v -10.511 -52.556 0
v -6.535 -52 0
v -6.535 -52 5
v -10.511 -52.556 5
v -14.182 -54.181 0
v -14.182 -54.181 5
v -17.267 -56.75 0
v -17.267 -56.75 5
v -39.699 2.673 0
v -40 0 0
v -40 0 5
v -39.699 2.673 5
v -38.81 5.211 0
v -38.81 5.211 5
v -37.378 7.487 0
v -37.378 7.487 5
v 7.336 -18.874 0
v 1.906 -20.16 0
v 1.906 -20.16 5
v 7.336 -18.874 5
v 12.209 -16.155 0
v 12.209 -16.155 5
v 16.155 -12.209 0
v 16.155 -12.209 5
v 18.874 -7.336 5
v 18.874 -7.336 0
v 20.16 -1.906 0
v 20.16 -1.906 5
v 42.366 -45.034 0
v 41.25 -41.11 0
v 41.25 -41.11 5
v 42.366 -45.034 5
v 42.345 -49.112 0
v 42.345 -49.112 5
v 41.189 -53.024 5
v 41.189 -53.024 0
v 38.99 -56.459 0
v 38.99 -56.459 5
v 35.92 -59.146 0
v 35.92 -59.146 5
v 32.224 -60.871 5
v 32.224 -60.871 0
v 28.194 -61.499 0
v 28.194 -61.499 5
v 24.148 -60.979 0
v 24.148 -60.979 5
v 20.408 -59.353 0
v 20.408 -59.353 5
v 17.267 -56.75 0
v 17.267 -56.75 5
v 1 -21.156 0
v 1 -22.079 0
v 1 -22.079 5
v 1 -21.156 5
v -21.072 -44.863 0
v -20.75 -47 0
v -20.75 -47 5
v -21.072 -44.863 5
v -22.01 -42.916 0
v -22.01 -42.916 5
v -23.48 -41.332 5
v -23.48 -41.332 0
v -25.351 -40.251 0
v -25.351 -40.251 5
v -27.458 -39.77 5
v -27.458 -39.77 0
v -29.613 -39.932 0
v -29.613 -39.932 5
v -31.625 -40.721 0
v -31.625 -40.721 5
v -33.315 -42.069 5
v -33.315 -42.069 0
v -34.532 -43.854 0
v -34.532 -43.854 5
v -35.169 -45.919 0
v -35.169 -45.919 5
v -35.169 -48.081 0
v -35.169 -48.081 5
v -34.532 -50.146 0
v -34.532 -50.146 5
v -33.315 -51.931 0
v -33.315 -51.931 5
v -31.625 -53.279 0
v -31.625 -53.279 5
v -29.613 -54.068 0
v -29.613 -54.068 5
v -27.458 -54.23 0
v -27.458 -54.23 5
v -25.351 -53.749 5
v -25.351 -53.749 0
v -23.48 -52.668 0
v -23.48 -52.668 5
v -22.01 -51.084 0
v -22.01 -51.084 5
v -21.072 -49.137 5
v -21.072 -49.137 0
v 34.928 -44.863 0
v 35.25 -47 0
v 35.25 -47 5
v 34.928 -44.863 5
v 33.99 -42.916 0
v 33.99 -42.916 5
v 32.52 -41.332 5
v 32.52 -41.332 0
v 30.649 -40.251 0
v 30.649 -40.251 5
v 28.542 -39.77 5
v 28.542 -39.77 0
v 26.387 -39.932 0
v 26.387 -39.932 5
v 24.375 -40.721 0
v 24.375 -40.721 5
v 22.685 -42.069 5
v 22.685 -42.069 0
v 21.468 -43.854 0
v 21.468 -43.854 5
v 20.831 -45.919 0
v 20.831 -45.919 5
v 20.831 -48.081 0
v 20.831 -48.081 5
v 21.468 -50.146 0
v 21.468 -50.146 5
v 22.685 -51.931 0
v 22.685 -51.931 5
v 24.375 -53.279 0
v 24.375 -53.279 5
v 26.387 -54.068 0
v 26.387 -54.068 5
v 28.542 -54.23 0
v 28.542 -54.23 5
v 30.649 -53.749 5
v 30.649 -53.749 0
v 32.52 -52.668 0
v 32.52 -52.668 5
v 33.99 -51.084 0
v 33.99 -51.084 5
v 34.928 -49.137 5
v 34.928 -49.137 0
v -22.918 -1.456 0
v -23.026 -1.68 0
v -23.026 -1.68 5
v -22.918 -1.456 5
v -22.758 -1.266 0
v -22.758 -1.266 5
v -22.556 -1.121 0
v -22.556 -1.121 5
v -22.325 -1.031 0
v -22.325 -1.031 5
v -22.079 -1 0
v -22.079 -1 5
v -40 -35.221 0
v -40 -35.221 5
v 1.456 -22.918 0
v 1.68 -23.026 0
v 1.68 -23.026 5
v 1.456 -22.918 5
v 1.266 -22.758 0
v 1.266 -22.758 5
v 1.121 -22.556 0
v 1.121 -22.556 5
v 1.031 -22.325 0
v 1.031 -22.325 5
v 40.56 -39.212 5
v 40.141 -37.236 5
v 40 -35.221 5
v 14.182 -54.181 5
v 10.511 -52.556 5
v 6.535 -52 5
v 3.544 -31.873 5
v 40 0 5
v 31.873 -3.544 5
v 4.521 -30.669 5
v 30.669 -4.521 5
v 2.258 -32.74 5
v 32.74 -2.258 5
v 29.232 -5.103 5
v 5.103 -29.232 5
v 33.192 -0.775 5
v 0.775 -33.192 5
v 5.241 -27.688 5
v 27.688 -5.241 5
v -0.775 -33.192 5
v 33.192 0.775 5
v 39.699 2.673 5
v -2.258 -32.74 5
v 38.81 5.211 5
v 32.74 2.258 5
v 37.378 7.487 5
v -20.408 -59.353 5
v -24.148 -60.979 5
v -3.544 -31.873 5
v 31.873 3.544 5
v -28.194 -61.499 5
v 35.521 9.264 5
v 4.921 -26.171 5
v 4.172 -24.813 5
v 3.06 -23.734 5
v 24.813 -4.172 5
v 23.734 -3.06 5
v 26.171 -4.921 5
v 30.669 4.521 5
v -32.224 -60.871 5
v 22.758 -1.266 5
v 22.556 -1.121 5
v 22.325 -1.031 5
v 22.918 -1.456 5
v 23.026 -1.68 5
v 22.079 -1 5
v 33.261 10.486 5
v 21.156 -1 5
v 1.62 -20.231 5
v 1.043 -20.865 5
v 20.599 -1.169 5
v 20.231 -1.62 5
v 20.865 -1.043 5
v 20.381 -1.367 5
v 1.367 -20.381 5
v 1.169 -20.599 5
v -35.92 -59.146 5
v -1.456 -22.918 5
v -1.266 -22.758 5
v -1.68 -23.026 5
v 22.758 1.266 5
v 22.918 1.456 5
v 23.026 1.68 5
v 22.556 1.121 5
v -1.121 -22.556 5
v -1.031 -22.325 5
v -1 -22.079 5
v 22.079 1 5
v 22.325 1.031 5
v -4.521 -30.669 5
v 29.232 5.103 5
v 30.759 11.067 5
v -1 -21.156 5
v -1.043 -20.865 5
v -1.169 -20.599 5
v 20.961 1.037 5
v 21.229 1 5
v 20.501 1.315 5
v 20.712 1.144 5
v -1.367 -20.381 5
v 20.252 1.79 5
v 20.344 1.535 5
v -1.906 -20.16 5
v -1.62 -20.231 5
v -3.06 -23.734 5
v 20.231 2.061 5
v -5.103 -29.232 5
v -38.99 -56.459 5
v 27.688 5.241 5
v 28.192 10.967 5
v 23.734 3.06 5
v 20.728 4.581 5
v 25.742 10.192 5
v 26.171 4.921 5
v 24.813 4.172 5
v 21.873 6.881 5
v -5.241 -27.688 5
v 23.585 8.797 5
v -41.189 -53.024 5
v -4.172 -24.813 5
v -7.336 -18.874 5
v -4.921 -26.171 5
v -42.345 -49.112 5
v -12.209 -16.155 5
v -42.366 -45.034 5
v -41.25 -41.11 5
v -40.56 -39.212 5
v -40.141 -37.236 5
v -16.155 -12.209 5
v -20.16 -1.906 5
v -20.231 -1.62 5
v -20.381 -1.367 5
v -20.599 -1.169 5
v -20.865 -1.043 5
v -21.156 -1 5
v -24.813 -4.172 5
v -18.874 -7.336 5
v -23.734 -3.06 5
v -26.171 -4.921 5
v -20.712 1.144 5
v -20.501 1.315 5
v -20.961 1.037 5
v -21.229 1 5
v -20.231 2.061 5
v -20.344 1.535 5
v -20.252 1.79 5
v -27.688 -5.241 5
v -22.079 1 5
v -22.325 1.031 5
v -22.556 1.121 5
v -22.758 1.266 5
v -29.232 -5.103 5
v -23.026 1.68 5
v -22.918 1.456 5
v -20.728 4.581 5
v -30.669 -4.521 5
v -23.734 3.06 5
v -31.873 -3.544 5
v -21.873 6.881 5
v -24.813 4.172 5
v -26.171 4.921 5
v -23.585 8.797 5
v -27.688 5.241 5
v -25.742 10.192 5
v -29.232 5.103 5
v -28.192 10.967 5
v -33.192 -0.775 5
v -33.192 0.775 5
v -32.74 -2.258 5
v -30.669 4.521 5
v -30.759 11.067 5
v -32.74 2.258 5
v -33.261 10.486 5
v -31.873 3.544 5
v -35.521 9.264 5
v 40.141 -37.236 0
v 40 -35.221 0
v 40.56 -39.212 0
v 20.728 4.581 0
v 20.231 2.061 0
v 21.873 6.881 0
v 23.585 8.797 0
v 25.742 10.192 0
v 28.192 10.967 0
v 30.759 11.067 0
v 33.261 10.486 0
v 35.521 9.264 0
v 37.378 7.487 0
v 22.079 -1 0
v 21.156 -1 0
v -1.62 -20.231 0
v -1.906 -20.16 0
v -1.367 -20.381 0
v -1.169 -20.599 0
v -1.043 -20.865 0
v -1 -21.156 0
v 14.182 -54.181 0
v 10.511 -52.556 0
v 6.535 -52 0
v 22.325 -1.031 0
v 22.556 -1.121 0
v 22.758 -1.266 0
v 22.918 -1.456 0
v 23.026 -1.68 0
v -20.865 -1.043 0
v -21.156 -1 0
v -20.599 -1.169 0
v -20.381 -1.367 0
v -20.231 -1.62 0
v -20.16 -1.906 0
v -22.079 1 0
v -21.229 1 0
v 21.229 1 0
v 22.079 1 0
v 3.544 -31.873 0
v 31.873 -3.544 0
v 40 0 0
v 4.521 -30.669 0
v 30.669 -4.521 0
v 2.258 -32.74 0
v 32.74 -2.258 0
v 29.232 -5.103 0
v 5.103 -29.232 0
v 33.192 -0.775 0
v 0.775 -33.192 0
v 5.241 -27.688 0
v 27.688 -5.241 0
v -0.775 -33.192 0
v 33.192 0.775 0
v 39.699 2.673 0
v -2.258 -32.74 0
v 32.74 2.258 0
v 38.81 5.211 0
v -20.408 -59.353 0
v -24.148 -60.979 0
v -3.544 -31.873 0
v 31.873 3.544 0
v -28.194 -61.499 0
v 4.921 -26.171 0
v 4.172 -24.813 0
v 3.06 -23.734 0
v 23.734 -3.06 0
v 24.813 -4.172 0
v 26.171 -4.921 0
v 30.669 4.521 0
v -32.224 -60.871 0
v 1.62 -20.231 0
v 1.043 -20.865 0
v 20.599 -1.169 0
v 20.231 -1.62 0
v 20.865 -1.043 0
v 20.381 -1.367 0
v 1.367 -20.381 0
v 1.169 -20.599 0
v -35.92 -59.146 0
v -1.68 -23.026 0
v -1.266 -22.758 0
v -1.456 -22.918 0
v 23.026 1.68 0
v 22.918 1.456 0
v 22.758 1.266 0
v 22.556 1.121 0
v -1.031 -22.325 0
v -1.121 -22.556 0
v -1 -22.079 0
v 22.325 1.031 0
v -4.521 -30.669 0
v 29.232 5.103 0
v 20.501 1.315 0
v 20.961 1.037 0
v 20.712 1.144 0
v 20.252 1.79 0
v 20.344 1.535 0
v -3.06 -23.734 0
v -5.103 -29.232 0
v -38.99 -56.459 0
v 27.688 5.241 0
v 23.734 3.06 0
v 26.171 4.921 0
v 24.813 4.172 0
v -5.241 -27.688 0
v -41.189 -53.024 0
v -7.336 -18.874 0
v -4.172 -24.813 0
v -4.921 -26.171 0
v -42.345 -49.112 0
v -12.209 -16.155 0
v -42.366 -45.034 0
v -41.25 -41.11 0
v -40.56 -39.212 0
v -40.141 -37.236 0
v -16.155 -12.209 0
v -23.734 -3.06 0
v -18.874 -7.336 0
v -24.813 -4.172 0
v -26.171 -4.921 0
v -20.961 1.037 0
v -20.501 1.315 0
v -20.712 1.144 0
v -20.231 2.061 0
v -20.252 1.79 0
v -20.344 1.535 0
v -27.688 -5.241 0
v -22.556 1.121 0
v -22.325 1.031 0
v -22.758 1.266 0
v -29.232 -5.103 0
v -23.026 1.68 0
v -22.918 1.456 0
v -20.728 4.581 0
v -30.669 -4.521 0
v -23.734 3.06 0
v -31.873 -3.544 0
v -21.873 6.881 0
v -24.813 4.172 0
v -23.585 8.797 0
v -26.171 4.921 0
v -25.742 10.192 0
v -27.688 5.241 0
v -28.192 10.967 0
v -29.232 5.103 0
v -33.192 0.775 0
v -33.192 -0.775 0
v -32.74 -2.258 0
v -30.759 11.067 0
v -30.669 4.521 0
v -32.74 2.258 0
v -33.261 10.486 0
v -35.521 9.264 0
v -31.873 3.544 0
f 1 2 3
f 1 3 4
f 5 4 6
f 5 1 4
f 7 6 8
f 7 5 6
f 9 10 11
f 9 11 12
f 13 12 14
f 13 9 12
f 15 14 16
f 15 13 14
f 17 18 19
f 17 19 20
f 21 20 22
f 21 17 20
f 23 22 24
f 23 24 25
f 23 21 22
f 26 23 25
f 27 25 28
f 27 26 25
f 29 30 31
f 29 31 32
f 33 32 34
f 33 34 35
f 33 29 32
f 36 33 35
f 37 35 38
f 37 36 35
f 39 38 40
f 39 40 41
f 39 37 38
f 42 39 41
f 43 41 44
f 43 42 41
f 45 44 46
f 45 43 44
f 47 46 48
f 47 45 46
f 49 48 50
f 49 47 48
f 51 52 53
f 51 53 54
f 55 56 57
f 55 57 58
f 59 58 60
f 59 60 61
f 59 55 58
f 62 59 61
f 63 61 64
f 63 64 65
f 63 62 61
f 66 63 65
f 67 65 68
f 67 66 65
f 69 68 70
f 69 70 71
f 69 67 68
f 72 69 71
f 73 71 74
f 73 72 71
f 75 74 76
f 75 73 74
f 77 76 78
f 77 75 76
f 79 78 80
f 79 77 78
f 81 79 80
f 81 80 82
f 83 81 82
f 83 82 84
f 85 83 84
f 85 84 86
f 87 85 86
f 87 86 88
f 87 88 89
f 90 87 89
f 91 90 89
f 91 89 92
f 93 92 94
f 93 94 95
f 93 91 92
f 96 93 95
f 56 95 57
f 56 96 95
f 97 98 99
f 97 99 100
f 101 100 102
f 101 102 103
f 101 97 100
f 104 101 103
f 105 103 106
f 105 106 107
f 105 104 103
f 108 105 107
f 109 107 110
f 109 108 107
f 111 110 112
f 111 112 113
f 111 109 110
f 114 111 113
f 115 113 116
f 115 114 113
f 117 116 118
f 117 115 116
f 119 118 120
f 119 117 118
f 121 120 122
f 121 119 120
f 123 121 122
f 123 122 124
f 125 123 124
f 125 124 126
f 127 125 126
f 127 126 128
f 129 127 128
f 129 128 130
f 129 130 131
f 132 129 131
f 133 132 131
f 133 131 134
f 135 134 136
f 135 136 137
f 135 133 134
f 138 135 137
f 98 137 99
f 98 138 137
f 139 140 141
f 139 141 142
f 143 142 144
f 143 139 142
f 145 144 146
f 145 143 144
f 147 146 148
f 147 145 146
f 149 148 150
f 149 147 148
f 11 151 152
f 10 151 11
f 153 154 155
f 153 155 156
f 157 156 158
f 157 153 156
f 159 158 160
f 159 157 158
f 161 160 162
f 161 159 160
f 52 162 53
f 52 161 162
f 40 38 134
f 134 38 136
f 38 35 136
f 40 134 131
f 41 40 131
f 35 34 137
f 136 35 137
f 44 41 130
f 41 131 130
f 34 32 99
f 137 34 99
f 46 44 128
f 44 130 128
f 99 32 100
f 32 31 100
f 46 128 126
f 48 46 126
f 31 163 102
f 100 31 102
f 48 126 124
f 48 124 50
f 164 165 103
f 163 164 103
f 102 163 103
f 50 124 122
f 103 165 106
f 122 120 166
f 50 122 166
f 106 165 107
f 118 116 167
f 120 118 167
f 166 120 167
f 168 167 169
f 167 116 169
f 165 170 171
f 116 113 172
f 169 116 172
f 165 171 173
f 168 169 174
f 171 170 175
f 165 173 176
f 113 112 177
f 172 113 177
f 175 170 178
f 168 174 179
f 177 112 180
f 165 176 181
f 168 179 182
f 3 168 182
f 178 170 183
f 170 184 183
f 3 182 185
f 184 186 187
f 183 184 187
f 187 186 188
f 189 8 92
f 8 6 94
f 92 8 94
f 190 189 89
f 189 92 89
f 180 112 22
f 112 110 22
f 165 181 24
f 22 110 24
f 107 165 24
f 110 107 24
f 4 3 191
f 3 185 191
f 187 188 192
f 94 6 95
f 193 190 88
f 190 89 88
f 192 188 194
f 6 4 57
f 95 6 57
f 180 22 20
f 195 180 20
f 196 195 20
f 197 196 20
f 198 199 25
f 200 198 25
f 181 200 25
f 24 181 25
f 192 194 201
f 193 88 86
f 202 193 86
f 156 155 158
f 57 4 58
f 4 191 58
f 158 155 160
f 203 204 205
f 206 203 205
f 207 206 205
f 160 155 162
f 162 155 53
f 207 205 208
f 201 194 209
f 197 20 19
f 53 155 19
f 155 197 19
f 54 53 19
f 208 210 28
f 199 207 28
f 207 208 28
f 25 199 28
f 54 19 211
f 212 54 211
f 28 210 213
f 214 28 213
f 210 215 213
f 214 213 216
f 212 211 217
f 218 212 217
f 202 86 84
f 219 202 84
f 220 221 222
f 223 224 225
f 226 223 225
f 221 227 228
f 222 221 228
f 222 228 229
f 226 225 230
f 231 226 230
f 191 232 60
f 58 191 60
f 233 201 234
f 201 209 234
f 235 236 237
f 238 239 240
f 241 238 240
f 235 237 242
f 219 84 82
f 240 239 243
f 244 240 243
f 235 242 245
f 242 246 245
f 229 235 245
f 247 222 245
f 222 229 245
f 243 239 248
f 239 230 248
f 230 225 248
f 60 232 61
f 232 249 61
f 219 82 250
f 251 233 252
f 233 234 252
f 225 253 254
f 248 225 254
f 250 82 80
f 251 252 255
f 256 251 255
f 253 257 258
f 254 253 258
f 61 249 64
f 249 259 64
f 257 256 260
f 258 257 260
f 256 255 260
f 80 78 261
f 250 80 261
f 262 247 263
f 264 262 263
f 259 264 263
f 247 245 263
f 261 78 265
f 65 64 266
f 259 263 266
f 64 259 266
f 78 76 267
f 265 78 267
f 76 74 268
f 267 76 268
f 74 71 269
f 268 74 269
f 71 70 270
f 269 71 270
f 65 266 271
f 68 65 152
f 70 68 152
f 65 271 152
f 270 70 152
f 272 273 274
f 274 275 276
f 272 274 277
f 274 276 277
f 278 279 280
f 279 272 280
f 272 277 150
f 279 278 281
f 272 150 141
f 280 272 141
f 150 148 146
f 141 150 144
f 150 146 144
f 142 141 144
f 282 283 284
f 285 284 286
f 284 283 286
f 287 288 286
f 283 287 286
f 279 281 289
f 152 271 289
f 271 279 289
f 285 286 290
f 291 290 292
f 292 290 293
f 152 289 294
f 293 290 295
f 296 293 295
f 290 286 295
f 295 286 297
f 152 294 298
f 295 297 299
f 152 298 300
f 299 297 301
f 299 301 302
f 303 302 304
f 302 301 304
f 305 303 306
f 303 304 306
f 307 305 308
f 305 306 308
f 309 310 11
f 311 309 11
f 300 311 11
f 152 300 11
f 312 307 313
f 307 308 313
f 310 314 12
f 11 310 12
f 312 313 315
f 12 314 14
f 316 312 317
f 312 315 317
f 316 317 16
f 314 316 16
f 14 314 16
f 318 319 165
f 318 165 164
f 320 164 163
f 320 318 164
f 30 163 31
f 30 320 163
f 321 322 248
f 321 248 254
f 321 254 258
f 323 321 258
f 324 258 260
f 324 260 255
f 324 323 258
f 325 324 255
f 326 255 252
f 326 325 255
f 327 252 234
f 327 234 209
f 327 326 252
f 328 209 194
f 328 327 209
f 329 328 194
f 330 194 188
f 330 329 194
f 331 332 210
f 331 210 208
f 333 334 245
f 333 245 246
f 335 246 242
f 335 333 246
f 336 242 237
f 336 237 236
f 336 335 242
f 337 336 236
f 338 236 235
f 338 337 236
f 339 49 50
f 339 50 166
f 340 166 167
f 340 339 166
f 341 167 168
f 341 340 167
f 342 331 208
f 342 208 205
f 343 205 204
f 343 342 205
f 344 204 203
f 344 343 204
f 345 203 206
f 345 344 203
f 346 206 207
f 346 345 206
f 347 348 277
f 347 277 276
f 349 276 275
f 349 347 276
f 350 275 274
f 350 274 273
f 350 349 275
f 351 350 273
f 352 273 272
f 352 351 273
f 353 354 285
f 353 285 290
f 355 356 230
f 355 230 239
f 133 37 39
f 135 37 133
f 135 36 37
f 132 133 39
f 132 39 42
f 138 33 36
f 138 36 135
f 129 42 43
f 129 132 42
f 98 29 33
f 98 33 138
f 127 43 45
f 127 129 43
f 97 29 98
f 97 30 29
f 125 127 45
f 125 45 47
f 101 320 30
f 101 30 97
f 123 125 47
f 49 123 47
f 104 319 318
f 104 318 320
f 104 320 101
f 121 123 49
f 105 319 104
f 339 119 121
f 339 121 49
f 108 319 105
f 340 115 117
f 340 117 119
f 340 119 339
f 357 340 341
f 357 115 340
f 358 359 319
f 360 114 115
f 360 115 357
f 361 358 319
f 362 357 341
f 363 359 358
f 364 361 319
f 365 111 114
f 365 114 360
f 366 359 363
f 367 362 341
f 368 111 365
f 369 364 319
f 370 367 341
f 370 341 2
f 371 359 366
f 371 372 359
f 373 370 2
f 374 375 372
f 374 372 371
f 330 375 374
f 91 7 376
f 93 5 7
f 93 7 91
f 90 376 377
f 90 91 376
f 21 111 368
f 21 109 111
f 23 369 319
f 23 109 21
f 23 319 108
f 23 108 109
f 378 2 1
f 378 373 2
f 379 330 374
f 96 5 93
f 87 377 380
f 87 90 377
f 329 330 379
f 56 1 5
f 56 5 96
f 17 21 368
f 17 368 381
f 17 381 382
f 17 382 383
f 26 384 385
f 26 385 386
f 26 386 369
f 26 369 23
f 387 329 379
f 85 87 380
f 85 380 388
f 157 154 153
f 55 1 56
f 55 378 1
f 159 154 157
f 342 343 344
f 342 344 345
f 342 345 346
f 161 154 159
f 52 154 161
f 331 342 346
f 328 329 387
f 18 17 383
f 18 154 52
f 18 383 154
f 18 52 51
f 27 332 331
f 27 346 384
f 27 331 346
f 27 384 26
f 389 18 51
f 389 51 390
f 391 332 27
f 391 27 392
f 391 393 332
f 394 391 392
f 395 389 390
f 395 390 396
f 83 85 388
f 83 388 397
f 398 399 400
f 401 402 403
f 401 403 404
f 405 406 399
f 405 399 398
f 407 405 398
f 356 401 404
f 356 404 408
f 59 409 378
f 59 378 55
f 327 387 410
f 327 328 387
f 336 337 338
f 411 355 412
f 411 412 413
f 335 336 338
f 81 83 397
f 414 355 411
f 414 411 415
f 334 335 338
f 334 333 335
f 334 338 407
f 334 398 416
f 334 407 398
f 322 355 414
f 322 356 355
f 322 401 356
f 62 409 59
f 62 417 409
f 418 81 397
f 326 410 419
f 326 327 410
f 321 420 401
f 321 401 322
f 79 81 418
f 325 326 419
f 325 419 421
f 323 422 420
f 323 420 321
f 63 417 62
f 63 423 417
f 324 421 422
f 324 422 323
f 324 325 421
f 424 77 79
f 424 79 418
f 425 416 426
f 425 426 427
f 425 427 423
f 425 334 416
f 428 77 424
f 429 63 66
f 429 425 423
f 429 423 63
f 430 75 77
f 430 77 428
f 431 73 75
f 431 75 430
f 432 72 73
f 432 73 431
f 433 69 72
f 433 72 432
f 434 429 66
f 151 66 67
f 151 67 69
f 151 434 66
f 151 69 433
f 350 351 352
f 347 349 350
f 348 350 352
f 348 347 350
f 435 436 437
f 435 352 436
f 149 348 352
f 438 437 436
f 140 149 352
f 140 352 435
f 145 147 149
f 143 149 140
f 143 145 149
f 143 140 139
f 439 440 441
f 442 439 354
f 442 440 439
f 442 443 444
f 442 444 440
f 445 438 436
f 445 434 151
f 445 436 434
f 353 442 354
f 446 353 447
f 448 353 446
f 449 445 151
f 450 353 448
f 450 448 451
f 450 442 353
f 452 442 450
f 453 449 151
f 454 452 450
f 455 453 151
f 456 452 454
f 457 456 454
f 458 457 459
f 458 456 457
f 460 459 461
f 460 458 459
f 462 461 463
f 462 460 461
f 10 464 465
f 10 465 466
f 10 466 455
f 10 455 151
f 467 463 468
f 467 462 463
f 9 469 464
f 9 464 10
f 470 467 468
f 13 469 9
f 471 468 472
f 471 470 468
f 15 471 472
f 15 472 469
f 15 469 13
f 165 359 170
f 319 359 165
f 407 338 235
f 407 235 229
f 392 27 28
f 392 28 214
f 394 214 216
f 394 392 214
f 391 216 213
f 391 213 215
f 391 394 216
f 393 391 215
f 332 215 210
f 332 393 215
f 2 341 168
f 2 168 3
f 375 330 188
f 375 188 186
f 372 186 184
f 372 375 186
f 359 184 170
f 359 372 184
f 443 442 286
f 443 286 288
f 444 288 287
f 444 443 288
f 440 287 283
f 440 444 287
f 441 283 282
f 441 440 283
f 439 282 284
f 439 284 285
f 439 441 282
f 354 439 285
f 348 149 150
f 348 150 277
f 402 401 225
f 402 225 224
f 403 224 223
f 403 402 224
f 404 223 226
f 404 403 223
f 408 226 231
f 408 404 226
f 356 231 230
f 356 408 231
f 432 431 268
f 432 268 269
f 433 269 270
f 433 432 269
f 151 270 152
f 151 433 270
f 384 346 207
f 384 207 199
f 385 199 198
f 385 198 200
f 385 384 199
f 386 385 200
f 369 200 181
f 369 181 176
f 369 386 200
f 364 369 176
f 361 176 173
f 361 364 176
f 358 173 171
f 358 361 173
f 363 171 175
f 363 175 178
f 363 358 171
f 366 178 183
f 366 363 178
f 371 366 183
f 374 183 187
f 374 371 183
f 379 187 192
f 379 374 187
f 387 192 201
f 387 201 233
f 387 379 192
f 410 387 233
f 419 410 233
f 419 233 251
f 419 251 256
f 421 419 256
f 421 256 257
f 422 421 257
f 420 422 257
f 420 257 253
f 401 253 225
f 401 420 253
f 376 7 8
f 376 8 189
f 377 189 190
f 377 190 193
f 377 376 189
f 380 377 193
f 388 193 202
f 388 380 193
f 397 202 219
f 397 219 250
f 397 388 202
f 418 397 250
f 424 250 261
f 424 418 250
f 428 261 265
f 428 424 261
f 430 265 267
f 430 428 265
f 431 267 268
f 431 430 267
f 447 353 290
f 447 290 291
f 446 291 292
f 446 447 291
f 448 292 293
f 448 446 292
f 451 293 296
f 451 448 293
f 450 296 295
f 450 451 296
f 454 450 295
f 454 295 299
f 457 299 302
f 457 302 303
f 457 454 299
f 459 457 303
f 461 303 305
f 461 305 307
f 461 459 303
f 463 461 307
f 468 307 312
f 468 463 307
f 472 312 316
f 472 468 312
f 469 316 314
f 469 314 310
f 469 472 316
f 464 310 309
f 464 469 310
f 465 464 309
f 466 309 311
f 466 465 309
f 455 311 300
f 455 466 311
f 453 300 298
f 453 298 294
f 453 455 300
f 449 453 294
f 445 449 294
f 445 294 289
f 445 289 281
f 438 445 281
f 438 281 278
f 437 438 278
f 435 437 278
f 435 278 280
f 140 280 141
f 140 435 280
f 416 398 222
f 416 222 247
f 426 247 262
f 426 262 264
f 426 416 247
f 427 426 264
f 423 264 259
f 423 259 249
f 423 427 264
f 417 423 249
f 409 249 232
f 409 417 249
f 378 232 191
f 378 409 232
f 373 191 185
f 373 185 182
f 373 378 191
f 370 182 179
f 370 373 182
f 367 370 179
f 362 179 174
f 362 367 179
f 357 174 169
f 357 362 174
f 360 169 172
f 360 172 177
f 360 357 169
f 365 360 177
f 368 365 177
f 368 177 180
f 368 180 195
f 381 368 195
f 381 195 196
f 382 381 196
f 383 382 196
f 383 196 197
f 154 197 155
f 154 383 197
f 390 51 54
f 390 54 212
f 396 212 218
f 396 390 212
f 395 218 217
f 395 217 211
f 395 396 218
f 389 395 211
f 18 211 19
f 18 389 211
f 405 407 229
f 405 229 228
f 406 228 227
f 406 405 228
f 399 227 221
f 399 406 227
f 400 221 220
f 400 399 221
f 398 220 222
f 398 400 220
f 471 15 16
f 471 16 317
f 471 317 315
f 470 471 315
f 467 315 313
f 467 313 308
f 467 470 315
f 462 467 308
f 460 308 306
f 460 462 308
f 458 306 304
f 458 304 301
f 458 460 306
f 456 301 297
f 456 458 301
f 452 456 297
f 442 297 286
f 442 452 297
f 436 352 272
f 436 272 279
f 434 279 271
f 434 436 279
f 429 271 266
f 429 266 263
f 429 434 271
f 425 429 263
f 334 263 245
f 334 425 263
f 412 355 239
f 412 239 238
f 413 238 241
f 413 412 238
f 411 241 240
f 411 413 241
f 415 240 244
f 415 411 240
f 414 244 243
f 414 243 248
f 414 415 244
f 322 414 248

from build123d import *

# Parameters (mm, degrees)
SKETCH1_R      = 7.25
EXTRUDE1_DEPTH = 5


with BuildPart() as part:
    # Sketch1 → Extrude1 (new body)
    with BuildSketch(Plane.XY):
        with BuildLine():
            Line((21.155672998, -1), (22.078640359, -1))
            ThreePointArc((22.078640359, -1), (22.661735548, -1.18759616), (23.026057901, -1.68))
            ThreePointArc((23.026057901, -1.68), (33.25, 0), (23.026057901, 1.68))
            ThreePointArc((23.026057901, 1.68), (22.661735548, 1.18759616), (22.078640359, 1))
            Line((22.078640359, 1), (21.2294652, 1))
            ThreePointArc((21.2294652, 1), (20.50121081, 1.314693102), (20.231309687, 2.060708911))
            ThreePointArc((20.231309687, 2.060708911), (26.941055993, 10.661478857), (37.377512662, 7.48747329))
            ThreePointArc((37.377512662, 7.48747329), (39.325417254, 3.966727118), (40, 0))
            Line((40, 0), (40, -35.220781011))
            ThreePointArc((40, -35.220781011), (40.315942047, -38.231179655), (41.25, -41.110390505))
            ThreePointArc((41.25, -41.110390505), (35.920463529, -59.145627093), (17.267456033, -56.75))
            ThreePointArc((17.267456033, -56.75), (12.403259363, -53.240569394), (6.534912066, -52))
            Line((6.534912066, -52), (-6.534912066, -52))
            ThreePointArc((-6.534912066, -52), (-12.403259363, -53.240569394), (-17.267456033, -56.75))
            ThreePointArc((-17.267456033, -56.75), (-35.920463529, -59.145627093), (-41.25, -41.110390505))
            ThreePointArc((-41.25, -41.110390505), (-40.315942047, -38.231179655), (-40, -35.220781011))
            Line((-40, -35.220781011), (-40, 0))
            ThreePointArc((-40, 0), (-39.325417254, 3.966727118), (-37.377512662, 7.48747329))
            ThreePointArc((-37.377512662, 7.48747329), (-26.941055993, 10.661478857), (-20.231309687, 2.060708911))
            ThreePointArc((-20.231309687, 2.060708911), (-20.50121081, 1.314693102), (-21.2294652, 1))
            Line((-21.2294652, 1), (-22.078640359, 1))
            ThreePointArc((-22.078640359, 1), (-22.661735548, 1.18759616), (-23.026057901, 1.68))
            ThreePointArc((-23.026057901, 1.68), (-33.25, 0), (-23.026057901, -1.68))
            ThreePointArc((-23.026057901, -1.68), (-22.661735548, -1.18759616), (-22.078640359, -1))
            Line((-22.078640359, -1), (-21.155672998, -1))
            ThreePointArc((-21.155672998, -1), (-20.482663952, -1.26036575), (-20.160111916, -1.905882353))
            ThreePointArc((-20.160111916, -1.905882353), (-14.318912319, -14.318912319), (-1.905882353, -20.160111916))
            ThreePointArc((-1.905882353, -20.160111916), (-1.26036575, -20.482663952), (-1, -21.155672998))
            Line((-1, -21.155672998), (-1, -22.078640359))
            ThreePointArc((-1, -22.078640359), (-1.18759616, -22.661735548), (-1.68, -23.026057901))
            ThreePointArc((-1.68, -23.026057901), (0, -33.25), (1.68, -23.026057901))
            ThreePointArc((1.68, -23.026057901), (1.18759616, -22.661735548), (1, -22.078640359))
            Line((1, -22.078640359), (1, -21.155672998))
            ThreePointArc((1, -21.155672998), (1.26036575, -20.482663952), (1.905882353, -20.160111916))
            ThreePointArc((1.905882353, -20.160111916), (14.318912319, -14.318912319), (20.160111916, -1.905882353))
            ThreePointArc((20.160111916, -1.905882353), (20.482663952, -1.26036575), (21.155672998, -1))
        make_face()
        with Locations((28, -47)):
            Circle(SKETCH1_R, mode=Mode.SUBTRACT)
        with Locations((-28, -47)):
            Circle(SKETCH1_R, mode=Mode.SUBTRACT)
    extrude(amount=EXTRUDE1_DEPTH)


solid = part.part
